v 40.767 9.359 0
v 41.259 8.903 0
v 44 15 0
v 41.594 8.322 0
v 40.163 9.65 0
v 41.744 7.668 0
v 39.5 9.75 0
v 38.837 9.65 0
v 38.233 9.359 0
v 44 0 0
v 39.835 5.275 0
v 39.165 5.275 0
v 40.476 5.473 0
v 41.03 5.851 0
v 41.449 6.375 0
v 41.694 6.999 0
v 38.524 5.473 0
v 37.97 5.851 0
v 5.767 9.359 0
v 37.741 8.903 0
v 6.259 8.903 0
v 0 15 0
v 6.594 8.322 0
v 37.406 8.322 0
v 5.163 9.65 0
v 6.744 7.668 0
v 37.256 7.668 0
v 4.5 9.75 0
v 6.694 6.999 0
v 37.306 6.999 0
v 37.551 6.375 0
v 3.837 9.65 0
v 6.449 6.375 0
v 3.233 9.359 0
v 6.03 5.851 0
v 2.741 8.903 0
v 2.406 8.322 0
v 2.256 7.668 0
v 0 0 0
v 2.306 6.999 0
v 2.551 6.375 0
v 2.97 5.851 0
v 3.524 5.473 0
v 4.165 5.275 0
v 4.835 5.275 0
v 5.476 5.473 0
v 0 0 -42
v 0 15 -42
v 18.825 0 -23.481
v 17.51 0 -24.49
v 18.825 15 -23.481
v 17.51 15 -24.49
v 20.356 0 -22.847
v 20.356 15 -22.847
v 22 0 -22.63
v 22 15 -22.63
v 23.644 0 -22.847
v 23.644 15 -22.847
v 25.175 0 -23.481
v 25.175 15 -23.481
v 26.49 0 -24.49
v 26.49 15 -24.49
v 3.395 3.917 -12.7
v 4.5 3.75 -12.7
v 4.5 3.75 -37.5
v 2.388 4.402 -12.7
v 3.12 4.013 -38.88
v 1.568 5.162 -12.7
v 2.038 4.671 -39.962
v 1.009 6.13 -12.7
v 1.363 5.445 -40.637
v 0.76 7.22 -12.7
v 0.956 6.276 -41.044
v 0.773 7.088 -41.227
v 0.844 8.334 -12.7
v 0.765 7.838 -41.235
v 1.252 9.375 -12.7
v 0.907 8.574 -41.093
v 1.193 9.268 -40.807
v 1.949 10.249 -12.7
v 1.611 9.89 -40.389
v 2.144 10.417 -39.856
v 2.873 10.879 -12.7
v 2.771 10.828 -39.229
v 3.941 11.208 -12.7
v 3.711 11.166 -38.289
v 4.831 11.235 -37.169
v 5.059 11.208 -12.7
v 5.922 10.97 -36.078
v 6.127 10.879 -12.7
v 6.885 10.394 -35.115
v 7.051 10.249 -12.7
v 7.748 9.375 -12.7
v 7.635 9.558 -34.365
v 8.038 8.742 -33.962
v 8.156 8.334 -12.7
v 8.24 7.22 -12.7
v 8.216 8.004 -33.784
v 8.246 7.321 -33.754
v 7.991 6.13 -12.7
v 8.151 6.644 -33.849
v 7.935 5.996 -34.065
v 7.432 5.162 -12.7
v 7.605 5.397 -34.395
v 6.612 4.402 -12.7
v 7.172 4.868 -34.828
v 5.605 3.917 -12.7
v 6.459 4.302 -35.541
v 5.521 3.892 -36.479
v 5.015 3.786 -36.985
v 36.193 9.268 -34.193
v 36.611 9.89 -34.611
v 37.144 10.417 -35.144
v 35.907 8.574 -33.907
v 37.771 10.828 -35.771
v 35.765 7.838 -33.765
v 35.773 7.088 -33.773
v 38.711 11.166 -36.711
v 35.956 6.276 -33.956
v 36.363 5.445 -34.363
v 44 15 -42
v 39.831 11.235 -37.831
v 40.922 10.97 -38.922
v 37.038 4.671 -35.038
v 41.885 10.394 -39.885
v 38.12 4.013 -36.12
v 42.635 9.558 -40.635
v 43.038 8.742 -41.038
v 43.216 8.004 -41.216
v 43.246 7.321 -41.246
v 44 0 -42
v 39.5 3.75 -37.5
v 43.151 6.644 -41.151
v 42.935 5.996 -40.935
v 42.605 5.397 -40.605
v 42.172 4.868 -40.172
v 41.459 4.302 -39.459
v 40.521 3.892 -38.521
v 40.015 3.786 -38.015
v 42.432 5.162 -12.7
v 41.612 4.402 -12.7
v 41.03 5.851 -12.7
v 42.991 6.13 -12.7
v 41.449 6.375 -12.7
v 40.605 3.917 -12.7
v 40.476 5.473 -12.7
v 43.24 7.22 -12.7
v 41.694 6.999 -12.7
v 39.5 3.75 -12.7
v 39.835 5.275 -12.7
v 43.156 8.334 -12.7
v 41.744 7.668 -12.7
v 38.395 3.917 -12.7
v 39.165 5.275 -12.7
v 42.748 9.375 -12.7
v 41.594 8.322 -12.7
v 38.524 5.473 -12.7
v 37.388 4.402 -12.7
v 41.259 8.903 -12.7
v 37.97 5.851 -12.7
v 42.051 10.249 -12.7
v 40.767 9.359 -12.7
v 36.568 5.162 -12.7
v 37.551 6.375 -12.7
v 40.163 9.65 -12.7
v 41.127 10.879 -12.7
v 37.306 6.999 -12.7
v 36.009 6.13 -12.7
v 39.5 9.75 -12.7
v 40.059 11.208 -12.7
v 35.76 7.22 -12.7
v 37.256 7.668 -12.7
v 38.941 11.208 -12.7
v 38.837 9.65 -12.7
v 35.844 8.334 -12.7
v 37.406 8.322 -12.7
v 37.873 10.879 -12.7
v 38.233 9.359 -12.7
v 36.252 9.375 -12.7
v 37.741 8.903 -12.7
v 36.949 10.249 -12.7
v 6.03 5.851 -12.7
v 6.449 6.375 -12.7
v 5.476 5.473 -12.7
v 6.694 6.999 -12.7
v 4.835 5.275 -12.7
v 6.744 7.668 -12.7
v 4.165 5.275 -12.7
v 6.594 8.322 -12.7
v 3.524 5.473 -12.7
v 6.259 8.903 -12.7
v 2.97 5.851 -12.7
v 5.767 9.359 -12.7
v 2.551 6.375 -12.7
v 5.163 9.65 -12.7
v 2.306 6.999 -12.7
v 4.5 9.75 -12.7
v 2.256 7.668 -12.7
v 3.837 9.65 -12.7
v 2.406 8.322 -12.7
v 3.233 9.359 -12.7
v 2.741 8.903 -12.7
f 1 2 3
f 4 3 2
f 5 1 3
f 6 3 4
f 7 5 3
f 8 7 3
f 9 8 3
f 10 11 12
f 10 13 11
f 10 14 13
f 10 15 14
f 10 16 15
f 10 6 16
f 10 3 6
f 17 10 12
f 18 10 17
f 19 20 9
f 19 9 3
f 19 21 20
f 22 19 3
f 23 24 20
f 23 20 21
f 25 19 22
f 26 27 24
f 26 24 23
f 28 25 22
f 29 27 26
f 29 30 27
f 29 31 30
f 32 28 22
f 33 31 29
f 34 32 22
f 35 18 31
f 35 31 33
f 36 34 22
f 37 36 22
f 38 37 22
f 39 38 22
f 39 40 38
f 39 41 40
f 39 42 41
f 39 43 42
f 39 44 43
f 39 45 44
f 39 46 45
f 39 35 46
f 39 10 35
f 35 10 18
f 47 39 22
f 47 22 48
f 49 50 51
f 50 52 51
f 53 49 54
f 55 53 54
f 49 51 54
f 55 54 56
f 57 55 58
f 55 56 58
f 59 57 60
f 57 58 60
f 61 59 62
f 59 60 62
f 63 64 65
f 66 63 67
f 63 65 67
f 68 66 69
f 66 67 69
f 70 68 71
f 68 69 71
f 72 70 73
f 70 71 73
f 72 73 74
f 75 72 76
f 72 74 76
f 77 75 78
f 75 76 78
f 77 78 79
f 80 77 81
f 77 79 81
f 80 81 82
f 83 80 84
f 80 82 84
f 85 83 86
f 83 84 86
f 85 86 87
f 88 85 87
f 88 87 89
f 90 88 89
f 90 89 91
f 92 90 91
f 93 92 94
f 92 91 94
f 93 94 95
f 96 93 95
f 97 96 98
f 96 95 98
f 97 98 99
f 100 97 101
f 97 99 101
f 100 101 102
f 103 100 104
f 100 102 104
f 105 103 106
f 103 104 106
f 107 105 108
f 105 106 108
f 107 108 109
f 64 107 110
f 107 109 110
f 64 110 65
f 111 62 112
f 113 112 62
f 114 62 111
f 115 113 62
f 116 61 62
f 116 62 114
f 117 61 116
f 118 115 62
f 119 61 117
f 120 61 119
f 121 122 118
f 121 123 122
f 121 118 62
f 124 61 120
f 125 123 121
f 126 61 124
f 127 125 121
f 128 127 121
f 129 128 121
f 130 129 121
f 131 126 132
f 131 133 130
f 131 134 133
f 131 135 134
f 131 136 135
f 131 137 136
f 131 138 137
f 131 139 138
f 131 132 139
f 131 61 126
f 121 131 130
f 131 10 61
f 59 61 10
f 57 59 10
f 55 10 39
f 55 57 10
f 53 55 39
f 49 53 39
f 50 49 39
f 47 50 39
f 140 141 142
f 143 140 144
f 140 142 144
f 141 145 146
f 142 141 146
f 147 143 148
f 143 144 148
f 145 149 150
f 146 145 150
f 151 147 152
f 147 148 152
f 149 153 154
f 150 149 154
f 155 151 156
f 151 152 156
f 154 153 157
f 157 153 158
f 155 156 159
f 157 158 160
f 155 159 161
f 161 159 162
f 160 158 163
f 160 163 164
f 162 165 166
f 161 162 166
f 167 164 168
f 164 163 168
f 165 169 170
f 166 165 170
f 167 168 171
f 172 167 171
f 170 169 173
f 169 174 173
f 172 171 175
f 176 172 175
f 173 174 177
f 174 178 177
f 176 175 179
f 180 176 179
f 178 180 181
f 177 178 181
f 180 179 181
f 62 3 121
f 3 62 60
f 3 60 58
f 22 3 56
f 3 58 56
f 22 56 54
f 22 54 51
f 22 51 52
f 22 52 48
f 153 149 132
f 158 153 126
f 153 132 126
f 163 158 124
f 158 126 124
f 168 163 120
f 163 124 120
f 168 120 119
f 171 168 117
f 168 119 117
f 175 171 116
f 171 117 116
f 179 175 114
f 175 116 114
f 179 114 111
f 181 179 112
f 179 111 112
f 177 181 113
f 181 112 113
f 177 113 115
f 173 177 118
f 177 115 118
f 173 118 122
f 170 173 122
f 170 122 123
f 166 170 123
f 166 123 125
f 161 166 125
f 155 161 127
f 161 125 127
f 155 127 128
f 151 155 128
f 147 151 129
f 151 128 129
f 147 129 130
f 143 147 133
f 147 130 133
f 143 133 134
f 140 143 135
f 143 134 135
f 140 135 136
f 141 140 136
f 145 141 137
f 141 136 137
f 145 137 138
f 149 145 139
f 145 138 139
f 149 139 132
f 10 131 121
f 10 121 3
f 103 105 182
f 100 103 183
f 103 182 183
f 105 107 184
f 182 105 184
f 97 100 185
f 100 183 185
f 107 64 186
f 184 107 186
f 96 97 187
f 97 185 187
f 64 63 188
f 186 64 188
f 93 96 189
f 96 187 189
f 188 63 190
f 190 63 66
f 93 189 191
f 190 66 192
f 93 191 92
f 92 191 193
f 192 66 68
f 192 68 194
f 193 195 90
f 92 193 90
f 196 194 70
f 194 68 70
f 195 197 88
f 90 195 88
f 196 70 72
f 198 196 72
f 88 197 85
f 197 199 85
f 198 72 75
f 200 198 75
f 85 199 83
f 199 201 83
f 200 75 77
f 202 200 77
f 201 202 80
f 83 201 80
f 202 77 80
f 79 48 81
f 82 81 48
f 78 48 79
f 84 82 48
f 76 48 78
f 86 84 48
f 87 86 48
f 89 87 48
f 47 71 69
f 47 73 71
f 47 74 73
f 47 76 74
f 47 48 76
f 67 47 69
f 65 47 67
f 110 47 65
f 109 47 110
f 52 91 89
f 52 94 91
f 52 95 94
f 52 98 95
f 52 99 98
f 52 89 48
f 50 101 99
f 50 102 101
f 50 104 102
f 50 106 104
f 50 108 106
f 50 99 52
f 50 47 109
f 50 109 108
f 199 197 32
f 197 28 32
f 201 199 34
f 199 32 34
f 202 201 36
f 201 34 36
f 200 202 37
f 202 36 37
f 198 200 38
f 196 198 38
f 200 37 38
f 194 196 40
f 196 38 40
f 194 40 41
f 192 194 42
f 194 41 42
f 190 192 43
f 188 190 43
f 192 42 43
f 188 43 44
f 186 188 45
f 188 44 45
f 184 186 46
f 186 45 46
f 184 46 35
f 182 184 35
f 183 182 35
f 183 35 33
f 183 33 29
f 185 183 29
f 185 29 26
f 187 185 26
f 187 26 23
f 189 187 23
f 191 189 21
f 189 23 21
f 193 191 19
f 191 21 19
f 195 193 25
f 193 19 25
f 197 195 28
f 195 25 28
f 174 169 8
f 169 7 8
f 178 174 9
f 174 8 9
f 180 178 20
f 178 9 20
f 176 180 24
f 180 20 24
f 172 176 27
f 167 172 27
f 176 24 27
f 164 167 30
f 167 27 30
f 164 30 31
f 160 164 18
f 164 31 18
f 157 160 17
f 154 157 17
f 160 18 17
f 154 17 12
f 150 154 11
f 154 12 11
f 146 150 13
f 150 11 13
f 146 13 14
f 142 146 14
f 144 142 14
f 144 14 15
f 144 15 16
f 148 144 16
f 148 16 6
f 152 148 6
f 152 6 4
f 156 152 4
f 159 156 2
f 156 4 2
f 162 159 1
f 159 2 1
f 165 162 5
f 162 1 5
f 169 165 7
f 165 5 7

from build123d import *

# Parameters (mm, degrees)
BOSS_EXTRUDE1_DEPTH            = 15
SKETCH11_W                     = 2.25
SKETCH11_H                     = 12.7
M4_CLEARANCE_HOLE5_AT_2_COUNT  = 2
M4_CLEARANCE_HOLE5_AT_2_PITCH  = 35
SKETCH13_W                     = 3.75
SKETCH13_H                     = 29.3
F_6_0MM_DOWEL_HOLE1_AT_2_COUNT = 2
F_6_0MM_DOWEL_HOLE1_AT_2_PITCH = 35
FILLET1_R                      = 6.35


with BuildPart() as part:
    # Sketch1 → Boss-Extrude1 (new body)
    with BuildSketch(Plane(origin=(0, 0, 0), x_dir=(1, 0, 0), z_dir=(0, 1, 0))):
        Polygon((0, 0), (0, 42), (22, 20), (44, 42), (44, 0), align=None)
    extrude(amount=BOSS_EXTRUDE1_DEPTH)

    # Sketch11 → M4 Clearance Hole5 (revolve, cut)
    with BuildSketch(Plane(origin=(39.5, 7.5, -12.7), x_dir=(0, 1, 0), z_dir=(1, 0, 0))):
        with Locations((1.125, 6.35)):
            Rectangle(SKETCH11_W, SKETCH11_H)
    m4_clearance_hole5 = revolve(axis=Axis((39.5, 7.5, -19.05), (0, 0, 1)), mode=Mode.SUBTRACT)

    # M4 Clearance Hole5 at 2: M4 Clearance Hole5 ×2
    with Locations(*[(-i * M4_CLEARANCE_HOLE5_AT_2_PITCH, 0, 0) for i in range(1, M4_CLEARANCE_HOLE5_AT_2_COUNT)]):
        add(m4_clearance_hole5, mode=Mode.SUBTRACT)

    # Sketch13 → Ø6.0mm Dowel Hole1 (revolve, cut)
    with BuildSketch(Plane(origin=(39.5, 7.5, -12.7), x_dir=(0, -1, 0), z_dir=(1, 0, 0))):
        with Locations((1.875, 14.65)):
            Rectangle(SKETCH13_W, SKETCH13_H)
    f_6_0mm_dowel_hole1 = revolve(axis=Axis((39.5, 7.5, -6.35), (0, 0, -1)), mode=Mode.SUBTRACT)

    # Ø6.0mm Dowel Hole1 at 2: Ø6.0mm Dowel Hole1 ×2
    with Locations(*[(-i * F_6_0MM_DOWEL_HOLE1_AT_2_PITCH, 0, 0) for i in range(1, F_6_0MM_DOWEL_HOLE1_AT_2_COUNT)]):
        add(f_6_0mm_dowel_hole1, mode=Mode.SUBTRACT)

    # Fillet1
    fillet1_edges = [part.edges().sort_by_distance(p)[0] for p in [
        (22, 7.5, -20),
    ]]
    fillet(fillet1_edges, radius=FILLET1_R)


solid = part.part
